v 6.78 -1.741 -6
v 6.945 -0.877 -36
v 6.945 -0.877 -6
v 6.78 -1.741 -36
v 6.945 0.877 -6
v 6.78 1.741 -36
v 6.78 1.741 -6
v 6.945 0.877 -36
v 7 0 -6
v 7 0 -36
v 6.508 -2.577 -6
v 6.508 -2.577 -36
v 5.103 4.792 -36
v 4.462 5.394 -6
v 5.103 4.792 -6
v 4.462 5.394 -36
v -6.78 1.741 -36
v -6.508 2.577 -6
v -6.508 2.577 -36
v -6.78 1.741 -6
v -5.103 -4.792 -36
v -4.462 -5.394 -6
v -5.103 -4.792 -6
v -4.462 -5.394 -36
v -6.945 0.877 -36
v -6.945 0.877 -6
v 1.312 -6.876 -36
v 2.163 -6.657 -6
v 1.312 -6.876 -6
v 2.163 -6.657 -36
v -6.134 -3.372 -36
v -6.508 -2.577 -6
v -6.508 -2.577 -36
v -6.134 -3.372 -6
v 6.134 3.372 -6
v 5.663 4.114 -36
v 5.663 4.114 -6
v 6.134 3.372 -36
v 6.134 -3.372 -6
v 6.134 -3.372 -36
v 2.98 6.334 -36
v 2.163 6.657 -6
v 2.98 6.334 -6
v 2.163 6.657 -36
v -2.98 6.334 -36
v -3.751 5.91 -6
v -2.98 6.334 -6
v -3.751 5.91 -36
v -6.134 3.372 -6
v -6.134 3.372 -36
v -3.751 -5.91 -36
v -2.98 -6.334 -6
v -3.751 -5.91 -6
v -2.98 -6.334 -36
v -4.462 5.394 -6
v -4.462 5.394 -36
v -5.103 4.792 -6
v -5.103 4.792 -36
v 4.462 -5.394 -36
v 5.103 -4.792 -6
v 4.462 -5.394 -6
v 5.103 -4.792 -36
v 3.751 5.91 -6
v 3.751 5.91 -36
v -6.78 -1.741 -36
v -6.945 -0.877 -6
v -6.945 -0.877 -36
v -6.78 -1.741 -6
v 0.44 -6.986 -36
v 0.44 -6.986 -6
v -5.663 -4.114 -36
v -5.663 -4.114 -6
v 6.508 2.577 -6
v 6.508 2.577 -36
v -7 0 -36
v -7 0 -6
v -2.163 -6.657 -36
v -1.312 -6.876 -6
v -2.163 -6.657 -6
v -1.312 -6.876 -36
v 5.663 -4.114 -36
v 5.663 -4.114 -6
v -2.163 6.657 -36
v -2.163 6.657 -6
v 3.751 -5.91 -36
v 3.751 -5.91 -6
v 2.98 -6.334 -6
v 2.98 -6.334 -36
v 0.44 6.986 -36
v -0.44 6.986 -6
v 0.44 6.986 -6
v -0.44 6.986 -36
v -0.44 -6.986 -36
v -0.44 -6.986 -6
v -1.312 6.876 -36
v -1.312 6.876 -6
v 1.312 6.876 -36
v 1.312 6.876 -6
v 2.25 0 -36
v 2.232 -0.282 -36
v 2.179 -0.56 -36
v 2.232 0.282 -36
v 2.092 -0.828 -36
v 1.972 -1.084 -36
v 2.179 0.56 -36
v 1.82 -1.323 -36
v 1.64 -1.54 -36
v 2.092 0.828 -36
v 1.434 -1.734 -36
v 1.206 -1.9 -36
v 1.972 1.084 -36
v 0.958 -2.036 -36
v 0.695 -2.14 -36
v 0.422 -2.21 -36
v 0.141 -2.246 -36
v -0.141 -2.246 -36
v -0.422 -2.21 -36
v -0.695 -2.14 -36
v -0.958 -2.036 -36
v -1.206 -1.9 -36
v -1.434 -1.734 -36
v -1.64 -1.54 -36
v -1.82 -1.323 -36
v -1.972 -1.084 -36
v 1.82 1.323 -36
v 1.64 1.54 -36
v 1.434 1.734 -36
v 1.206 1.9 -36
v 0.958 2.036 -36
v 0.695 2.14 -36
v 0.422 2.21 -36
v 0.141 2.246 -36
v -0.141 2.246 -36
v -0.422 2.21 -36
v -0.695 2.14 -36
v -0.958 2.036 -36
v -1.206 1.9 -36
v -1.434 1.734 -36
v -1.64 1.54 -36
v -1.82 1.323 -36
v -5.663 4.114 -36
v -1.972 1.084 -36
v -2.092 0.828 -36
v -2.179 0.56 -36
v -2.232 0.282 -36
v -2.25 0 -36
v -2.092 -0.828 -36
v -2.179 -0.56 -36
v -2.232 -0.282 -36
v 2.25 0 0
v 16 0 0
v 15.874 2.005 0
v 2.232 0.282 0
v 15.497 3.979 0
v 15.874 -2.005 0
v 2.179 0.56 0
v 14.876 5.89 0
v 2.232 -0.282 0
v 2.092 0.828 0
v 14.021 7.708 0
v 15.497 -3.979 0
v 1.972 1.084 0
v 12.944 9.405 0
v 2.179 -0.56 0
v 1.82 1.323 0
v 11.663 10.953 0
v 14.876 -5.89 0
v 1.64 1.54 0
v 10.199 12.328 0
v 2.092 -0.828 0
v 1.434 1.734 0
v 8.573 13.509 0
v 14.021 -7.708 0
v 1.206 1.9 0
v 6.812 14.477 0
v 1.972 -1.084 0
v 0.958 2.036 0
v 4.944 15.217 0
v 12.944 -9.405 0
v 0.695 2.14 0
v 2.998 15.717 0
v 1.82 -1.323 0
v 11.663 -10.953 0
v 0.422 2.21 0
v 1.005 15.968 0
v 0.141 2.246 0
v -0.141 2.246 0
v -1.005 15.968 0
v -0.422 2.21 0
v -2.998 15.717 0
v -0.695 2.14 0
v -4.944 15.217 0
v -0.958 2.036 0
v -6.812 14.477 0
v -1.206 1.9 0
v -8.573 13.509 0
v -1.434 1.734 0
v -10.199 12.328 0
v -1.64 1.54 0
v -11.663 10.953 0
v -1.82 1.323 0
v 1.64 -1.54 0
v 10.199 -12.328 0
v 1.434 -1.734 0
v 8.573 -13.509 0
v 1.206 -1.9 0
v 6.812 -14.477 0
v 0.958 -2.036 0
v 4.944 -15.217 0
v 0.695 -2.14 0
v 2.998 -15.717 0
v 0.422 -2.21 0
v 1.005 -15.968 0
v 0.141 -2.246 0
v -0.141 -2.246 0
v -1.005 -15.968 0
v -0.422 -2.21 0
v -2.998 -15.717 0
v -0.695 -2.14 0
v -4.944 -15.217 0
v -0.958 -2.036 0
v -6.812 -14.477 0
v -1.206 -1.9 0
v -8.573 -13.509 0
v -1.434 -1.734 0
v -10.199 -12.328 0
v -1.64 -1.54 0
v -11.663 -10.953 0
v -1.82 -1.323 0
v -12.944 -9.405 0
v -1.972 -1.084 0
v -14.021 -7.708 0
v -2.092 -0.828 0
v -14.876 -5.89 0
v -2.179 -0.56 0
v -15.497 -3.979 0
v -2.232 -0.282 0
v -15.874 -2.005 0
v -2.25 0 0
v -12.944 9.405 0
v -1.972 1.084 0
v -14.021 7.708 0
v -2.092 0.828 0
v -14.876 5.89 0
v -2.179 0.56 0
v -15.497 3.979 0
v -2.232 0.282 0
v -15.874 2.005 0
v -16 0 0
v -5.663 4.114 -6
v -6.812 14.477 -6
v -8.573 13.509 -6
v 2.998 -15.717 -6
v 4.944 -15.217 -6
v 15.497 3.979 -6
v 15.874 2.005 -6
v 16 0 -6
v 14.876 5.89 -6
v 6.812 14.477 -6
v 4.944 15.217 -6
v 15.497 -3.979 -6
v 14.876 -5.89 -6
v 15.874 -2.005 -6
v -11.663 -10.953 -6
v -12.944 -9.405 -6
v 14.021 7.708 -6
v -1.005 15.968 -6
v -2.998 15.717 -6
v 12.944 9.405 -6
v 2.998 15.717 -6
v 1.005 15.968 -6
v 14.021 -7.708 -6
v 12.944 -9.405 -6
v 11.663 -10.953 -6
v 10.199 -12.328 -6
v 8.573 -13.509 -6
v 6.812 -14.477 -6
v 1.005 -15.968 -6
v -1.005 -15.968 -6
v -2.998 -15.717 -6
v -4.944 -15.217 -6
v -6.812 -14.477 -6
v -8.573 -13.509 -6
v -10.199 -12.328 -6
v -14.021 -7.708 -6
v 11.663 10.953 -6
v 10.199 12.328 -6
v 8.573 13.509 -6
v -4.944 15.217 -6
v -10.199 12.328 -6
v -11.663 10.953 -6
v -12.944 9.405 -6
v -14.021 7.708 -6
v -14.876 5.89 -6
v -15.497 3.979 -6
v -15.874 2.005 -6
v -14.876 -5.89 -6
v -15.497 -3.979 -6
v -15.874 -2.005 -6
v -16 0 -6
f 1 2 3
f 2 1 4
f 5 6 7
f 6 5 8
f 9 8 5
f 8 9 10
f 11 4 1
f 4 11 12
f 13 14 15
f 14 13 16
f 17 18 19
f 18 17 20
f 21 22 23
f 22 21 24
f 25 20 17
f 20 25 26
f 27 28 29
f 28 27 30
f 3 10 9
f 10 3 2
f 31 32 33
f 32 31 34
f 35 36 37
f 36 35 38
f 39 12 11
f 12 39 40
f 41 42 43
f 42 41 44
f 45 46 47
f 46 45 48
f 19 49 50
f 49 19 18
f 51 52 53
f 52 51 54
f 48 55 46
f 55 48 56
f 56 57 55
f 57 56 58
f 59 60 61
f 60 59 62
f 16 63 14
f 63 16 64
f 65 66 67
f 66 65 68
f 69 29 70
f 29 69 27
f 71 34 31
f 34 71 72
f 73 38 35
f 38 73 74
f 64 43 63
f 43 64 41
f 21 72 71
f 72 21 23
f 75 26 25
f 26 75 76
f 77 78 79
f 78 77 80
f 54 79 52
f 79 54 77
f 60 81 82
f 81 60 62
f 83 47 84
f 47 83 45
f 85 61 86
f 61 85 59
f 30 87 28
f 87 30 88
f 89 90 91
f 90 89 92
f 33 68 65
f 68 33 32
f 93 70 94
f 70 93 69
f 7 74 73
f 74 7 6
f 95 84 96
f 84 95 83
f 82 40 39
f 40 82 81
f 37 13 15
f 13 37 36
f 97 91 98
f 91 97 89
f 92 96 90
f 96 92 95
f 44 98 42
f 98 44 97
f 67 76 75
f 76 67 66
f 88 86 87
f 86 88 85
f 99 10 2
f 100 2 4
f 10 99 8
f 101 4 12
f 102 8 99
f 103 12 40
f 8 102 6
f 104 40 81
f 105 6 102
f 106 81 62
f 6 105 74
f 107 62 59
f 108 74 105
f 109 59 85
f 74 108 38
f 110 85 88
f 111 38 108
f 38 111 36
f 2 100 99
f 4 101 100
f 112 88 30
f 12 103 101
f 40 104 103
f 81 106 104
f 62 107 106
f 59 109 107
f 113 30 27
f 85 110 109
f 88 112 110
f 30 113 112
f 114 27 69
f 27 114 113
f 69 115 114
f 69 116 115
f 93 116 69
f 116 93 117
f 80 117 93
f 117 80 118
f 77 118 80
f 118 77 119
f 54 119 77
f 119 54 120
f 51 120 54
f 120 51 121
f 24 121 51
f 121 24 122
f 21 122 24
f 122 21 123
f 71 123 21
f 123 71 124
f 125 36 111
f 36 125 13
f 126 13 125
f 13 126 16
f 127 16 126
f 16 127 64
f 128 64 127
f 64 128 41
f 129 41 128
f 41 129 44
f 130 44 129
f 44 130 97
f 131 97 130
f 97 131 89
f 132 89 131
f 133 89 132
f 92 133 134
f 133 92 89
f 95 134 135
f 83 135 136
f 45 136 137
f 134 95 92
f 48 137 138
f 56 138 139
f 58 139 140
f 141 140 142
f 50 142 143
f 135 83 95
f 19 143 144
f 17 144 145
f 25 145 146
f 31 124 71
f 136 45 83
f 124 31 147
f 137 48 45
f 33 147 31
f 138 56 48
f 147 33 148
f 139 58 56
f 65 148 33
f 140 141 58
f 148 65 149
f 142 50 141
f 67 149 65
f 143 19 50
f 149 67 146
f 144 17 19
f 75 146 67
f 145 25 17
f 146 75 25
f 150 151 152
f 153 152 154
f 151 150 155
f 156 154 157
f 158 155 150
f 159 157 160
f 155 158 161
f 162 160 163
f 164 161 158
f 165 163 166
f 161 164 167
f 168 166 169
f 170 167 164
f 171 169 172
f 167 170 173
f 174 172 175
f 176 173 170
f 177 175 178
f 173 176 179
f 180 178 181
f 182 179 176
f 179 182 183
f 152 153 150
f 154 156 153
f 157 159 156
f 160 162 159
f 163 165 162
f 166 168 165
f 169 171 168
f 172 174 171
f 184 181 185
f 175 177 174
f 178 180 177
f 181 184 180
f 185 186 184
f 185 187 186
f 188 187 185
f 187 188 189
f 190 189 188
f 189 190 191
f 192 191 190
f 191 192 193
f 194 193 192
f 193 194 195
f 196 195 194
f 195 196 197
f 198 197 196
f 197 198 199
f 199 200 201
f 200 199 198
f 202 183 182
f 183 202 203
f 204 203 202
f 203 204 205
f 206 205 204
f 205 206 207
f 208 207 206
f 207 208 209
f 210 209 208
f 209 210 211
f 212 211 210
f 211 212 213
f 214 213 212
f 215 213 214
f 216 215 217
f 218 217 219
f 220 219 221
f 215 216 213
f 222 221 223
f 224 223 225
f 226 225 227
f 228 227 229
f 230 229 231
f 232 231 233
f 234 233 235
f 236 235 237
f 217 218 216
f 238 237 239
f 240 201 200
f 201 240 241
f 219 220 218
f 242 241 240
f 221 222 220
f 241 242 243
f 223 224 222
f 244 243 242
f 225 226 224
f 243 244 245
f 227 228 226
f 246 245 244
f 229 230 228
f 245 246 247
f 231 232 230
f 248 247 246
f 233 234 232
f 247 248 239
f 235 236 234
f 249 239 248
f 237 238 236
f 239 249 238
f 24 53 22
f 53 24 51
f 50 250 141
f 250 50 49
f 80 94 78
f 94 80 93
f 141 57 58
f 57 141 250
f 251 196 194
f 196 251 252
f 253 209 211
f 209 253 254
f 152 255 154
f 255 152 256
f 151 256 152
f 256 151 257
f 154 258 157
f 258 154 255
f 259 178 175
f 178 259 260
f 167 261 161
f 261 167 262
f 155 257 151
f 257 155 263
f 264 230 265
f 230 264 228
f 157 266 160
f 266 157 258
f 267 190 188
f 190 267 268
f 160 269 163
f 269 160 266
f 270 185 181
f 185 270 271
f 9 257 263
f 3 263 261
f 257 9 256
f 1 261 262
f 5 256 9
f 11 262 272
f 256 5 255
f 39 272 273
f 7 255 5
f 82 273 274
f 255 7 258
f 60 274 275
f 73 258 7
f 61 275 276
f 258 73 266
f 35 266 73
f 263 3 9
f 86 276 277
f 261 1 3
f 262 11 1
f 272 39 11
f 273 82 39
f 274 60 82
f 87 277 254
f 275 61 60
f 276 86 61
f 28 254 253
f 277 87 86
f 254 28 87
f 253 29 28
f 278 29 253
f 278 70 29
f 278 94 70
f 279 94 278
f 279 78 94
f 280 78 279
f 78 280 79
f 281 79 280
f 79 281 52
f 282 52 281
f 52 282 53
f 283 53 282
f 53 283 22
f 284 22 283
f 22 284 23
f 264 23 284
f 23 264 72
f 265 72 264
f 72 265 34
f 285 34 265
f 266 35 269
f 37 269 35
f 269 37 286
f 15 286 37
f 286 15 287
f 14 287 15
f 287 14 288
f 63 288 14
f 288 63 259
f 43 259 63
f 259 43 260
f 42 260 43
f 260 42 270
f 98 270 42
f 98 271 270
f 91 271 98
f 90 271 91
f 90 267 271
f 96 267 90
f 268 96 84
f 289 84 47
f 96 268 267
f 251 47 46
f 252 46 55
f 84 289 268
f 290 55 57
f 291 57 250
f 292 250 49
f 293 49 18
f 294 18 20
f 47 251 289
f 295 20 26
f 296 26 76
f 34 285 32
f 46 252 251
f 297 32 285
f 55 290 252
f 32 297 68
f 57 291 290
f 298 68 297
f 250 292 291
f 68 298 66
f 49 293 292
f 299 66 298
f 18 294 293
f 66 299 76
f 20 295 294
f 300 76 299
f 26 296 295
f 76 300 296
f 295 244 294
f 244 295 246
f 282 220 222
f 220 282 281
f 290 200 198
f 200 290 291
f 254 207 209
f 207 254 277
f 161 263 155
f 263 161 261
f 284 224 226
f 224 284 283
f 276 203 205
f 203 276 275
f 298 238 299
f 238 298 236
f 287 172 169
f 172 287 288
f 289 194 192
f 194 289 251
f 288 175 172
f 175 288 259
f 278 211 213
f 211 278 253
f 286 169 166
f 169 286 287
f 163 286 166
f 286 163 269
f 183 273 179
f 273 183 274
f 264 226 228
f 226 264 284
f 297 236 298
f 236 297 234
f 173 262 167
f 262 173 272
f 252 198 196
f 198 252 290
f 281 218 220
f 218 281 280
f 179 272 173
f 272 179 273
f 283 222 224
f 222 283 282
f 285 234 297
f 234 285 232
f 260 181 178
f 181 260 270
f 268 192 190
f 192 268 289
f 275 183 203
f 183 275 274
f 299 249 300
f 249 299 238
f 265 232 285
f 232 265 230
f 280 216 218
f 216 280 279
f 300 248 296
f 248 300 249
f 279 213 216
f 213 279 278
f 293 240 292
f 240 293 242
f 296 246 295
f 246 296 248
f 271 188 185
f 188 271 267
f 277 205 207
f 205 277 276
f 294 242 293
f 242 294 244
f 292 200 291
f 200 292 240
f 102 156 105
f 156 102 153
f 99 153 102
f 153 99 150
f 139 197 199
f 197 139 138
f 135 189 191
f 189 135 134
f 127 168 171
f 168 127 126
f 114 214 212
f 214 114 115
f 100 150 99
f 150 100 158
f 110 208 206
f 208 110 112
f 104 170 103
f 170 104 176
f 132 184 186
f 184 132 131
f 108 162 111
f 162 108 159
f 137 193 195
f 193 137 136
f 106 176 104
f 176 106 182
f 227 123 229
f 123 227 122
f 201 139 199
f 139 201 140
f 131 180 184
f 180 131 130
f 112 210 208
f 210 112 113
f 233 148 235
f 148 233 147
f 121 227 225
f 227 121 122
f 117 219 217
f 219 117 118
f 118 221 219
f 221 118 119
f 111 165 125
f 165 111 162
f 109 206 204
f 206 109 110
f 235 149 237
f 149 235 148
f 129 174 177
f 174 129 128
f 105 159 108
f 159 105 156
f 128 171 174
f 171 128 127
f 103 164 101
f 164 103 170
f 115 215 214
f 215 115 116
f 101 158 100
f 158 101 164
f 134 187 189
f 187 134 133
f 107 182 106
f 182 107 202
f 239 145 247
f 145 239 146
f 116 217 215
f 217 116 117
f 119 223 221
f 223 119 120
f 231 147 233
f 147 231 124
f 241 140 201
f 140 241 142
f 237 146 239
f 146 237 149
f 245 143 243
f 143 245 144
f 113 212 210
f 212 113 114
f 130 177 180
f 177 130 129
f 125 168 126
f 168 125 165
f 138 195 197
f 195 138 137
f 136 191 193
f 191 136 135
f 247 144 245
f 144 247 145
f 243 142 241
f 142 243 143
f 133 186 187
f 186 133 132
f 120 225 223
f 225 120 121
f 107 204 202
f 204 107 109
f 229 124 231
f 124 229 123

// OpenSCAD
$fn = 50;


difference() {
	union() {
		translate(v = [0, 0, -36.0000000000]) {
			cylinder(h = 36, r = 7.0000000000);
		}
		translate(v = [0, 0, -6.0000000000]) {
			cylinder(h = 6, r = 16.0000000000);
		}
	}
	union() {
		#translate(v = [0, 0, -36]) {
			cylinder(h = 36, r = 2.2500000000);
		}
	}
}
